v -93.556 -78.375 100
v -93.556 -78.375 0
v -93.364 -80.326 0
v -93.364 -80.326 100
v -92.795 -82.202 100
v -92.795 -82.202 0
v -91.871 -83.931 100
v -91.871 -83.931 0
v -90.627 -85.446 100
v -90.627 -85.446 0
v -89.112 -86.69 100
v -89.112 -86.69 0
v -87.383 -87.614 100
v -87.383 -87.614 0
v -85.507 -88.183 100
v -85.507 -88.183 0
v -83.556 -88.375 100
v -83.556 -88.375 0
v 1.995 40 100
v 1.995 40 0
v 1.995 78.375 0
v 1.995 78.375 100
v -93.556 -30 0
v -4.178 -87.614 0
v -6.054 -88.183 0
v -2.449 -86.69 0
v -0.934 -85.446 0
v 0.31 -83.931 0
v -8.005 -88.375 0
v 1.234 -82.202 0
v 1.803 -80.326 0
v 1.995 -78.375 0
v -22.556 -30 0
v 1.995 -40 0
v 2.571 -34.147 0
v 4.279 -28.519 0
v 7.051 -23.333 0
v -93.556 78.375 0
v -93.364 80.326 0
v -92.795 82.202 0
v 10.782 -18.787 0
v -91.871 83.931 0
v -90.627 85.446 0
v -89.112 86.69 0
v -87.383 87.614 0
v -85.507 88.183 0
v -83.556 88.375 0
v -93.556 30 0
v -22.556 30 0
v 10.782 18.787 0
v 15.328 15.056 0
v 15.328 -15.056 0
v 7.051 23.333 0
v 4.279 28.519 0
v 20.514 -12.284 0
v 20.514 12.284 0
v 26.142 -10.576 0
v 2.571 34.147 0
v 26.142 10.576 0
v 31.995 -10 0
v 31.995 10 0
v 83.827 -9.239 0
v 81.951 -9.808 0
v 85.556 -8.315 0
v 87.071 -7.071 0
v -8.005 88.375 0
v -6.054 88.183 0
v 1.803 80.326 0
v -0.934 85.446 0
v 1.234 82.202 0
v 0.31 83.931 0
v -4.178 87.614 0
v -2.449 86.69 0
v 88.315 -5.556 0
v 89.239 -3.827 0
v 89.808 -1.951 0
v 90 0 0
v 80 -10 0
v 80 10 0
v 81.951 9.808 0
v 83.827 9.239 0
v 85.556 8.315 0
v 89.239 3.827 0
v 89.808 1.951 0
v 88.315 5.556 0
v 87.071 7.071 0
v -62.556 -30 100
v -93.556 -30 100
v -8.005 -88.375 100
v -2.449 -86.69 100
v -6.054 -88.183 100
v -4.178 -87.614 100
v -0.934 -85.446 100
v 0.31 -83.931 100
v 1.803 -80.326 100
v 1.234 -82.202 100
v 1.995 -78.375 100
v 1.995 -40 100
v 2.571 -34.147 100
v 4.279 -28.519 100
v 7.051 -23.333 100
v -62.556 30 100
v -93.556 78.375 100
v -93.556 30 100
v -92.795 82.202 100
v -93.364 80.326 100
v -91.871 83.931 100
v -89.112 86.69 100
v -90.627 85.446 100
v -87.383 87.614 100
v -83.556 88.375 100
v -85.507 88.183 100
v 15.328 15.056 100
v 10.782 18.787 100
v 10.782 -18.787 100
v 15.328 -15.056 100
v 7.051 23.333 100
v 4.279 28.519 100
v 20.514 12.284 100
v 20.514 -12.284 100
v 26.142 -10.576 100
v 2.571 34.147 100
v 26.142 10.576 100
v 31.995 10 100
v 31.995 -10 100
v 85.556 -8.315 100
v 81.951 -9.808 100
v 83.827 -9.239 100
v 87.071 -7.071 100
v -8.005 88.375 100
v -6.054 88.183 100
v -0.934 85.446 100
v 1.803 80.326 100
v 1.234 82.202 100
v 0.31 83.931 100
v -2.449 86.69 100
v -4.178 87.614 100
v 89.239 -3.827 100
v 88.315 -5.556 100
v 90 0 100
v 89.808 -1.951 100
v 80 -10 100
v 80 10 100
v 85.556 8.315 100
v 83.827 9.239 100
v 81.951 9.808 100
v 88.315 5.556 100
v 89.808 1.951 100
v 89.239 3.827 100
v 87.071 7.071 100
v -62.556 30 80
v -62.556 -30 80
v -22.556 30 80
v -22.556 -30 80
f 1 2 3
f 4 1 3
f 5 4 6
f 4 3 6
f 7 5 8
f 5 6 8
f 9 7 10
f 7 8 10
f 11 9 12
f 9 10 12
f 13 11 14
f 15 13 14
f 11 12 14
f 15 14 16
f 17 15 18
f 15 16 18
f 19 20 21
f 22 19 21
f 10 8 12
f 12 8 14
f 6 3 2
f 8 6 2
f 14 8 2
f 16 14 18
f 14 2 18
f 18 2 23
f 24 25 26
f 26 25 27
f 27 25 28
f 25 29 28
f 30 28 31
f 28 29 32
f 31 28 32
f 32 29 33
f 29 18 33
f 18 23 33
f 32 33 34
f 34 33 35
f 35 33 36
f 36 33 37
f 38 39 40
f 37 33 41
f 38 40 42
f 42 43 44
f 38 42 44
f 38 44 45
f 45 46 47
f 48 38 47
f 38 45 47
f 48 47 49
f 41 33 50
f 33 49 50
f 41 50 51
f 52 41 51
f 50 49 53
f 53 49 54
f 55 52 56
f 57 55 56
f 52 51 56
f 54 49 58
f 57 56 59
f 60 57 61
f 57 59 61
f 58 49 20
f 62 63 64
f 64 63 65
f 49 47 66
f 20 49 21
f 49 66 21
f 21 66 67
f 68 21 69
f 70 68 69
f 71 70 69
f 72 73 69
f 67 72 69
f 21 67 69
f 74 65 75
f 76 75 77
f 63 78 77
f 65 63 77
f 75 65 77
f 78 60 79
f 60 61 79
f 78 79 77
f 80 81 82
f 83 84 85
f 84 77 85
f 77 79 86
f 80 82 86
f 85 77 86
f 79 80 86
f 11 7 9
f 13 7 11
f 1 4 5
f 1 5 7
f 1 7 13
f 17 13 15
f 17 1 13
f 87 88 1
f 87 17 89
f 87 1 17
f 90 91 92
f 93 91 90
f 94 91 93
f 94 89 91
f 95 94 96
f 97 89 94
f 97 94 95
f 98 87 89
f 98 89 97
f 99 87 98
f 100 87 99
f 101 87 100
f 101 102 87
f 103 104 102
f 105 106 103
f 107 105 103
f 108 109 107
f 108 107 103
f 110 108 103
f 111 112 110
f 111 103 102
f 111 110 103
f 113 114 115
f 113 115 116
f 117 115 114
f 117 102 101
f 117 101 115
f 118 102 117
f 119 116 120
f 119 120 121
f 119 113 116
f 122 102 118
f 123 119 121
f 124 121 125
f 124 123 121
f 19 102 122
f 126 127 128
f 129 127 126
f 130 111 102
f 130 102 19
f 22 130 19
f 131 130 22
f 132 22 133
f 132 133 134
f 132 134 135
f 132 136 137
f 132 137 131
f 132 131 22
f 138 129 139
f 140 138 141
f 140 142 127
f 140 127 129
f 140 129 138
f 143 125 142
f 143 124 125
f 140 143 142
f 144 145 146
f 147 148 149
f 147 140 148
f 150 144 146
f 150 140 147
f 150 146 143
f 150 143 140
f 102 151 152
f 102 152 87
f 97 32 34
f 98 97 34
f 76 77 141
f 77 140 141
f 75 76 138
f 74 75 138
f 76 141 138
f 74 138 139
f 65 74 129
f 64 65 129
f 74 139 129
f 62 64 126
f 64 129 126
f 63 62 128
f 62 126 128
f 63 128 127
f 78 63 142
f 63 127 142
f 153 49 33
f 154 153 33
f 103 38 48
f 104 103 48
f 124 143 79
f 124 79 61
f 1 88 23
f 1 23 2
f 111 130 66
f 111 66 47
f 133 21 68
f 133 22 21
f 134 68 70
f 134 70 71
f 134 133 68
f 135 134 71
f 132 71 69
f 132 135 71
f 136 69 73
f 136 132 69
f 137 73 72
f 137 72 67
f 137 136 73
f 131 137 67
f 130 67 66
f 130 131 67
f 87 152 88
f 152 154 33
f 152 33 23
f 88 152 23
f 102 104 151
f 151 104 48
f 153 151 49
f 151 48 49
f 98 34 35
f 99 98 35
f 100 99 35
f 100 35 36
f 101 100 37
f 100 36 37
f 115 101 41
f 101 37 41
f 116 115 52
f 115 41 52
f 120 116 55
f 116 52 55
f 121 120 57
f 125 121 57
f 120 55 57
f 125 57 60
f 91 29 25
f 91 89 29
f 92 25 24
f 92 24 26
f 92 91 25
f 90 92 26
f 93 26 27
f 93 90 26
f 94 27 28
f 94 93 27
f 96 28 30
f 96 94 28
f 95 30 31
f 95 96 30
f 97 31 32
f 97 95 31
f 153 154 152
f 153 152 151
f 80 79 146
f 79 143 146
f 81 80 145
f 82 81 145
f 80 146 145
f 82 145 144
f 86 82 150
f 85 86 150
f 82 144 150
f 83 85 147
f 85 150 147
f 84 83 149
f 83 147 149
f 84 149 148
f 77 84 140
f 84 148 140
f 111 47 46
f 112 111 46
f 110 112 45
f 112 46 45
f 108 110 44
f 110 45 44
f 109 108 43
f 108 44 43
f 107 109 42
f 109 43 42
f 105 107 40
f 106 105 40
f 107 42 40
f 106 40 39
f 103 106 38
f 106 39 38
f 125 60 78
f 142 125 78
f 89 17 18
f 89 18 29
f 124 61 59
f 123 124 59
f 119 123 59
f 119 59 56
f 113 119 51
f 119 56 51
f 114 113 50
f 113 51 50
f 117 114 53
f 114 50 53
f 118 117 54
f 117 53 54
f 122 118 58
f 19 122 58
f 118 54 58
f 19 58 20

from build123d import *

# Parameters (mm, degrees)
BOSS_EXTRU_1_DEPTH = 100
ESQUISSE2_W        = 20
ESQUISSE2_H        = 60
BOSS_EXTRU_2_DEPTH = 40
CONG_1_R           = 10
CONG_2_R           = 10
CONG_3_R           = 10


with BuildPart() as part:
    # Esquisse1 → Boss.-Extru.1 (new body)
    with BuildSketch(Plane.XY):
        with BuildLine():
            Line((90, -10), (90, 10))
            Line((90, 10), (31.994888516, 10))
            ThreePointArc((31.994888516, 10), (10.78168508, 18.786796564), (1.994888516, 40))
            Line((1.994888516, 40), (1.994888516, 88.375065612))
            Line((1.994888516, 88.375065612), (-83.555876775, 88.375065612))
            ThreePointArc((-83.555876775, 88.375065612), (-90.626944587, 85.446133424), (-93.555876775, 78.375065612))
            Line((-93.555876775, 78.375065612), (-93.555876775, 30))
            Line((-93.555876775, 30), (-22.555876775, 30))
            Line((-22.555876775, 30), (-22.555876775, -30))
            Line((-22.555876775, -30), (-93.555876775, -30))
            Line((-93.555876775, -30), (-93.555876775, -78.375065612))
            ThreePointArc((-93.555876775, -78.375065612), (-90.626944587, -85.446133424), (-83.555876775, -88.375065612))
            Line((-83.555876775, -88.375065612), (1.994888516, -88.375065612))
            Line((1.994888516, -88.375065612), (1.994888516, -40))
            ThreePointArc((1.994888516, -40), (10.78168508, -18.786796564), (31.994888516, -10))
            Line((31.994888516, -10), (90, -10))
        make_face()
    extrude(amount=BOSS_EXTRU_1_DEPTH)

    # Esquisse2 → Boss.-Extru.2 (add)
    with BuildSketch(Plane.ZY.offset(22.555876775)):
        with Locations((90, 0)):
            Rectangle(ESQUISSE2_W, ESQUISSE2_H)
    extrude(amount=BOSS_EXTRU_2_DEPTH)

    # Congé1
    cong_1_edges = [part.edges().sort_by_distance(p)[0] for p in [
        (1.994888516, -88.375065612, 50),
    ]]
    fillet(cong_1_edges, radius=CONG_1_R)

    # Congé2
    cong_2_edges = [part.edges().sort_by_distance(p)[0] for p in [
        (1.994888516, 88.375065612, 50),
    ]]
    fillet(cong_2_edges, radius=CONG_2_R)

    # Congé3
    cong_3_edges = [part.edges().sort_by_distance(p)[0] for p in [
        (90, -10, 50),
        (90, 10, 50),
    ]]
    fillet(cong_3_edges, radius=CONG_3_R - 0.0001)  # a hair under: the kernel refuses the full size


solid = part.part
